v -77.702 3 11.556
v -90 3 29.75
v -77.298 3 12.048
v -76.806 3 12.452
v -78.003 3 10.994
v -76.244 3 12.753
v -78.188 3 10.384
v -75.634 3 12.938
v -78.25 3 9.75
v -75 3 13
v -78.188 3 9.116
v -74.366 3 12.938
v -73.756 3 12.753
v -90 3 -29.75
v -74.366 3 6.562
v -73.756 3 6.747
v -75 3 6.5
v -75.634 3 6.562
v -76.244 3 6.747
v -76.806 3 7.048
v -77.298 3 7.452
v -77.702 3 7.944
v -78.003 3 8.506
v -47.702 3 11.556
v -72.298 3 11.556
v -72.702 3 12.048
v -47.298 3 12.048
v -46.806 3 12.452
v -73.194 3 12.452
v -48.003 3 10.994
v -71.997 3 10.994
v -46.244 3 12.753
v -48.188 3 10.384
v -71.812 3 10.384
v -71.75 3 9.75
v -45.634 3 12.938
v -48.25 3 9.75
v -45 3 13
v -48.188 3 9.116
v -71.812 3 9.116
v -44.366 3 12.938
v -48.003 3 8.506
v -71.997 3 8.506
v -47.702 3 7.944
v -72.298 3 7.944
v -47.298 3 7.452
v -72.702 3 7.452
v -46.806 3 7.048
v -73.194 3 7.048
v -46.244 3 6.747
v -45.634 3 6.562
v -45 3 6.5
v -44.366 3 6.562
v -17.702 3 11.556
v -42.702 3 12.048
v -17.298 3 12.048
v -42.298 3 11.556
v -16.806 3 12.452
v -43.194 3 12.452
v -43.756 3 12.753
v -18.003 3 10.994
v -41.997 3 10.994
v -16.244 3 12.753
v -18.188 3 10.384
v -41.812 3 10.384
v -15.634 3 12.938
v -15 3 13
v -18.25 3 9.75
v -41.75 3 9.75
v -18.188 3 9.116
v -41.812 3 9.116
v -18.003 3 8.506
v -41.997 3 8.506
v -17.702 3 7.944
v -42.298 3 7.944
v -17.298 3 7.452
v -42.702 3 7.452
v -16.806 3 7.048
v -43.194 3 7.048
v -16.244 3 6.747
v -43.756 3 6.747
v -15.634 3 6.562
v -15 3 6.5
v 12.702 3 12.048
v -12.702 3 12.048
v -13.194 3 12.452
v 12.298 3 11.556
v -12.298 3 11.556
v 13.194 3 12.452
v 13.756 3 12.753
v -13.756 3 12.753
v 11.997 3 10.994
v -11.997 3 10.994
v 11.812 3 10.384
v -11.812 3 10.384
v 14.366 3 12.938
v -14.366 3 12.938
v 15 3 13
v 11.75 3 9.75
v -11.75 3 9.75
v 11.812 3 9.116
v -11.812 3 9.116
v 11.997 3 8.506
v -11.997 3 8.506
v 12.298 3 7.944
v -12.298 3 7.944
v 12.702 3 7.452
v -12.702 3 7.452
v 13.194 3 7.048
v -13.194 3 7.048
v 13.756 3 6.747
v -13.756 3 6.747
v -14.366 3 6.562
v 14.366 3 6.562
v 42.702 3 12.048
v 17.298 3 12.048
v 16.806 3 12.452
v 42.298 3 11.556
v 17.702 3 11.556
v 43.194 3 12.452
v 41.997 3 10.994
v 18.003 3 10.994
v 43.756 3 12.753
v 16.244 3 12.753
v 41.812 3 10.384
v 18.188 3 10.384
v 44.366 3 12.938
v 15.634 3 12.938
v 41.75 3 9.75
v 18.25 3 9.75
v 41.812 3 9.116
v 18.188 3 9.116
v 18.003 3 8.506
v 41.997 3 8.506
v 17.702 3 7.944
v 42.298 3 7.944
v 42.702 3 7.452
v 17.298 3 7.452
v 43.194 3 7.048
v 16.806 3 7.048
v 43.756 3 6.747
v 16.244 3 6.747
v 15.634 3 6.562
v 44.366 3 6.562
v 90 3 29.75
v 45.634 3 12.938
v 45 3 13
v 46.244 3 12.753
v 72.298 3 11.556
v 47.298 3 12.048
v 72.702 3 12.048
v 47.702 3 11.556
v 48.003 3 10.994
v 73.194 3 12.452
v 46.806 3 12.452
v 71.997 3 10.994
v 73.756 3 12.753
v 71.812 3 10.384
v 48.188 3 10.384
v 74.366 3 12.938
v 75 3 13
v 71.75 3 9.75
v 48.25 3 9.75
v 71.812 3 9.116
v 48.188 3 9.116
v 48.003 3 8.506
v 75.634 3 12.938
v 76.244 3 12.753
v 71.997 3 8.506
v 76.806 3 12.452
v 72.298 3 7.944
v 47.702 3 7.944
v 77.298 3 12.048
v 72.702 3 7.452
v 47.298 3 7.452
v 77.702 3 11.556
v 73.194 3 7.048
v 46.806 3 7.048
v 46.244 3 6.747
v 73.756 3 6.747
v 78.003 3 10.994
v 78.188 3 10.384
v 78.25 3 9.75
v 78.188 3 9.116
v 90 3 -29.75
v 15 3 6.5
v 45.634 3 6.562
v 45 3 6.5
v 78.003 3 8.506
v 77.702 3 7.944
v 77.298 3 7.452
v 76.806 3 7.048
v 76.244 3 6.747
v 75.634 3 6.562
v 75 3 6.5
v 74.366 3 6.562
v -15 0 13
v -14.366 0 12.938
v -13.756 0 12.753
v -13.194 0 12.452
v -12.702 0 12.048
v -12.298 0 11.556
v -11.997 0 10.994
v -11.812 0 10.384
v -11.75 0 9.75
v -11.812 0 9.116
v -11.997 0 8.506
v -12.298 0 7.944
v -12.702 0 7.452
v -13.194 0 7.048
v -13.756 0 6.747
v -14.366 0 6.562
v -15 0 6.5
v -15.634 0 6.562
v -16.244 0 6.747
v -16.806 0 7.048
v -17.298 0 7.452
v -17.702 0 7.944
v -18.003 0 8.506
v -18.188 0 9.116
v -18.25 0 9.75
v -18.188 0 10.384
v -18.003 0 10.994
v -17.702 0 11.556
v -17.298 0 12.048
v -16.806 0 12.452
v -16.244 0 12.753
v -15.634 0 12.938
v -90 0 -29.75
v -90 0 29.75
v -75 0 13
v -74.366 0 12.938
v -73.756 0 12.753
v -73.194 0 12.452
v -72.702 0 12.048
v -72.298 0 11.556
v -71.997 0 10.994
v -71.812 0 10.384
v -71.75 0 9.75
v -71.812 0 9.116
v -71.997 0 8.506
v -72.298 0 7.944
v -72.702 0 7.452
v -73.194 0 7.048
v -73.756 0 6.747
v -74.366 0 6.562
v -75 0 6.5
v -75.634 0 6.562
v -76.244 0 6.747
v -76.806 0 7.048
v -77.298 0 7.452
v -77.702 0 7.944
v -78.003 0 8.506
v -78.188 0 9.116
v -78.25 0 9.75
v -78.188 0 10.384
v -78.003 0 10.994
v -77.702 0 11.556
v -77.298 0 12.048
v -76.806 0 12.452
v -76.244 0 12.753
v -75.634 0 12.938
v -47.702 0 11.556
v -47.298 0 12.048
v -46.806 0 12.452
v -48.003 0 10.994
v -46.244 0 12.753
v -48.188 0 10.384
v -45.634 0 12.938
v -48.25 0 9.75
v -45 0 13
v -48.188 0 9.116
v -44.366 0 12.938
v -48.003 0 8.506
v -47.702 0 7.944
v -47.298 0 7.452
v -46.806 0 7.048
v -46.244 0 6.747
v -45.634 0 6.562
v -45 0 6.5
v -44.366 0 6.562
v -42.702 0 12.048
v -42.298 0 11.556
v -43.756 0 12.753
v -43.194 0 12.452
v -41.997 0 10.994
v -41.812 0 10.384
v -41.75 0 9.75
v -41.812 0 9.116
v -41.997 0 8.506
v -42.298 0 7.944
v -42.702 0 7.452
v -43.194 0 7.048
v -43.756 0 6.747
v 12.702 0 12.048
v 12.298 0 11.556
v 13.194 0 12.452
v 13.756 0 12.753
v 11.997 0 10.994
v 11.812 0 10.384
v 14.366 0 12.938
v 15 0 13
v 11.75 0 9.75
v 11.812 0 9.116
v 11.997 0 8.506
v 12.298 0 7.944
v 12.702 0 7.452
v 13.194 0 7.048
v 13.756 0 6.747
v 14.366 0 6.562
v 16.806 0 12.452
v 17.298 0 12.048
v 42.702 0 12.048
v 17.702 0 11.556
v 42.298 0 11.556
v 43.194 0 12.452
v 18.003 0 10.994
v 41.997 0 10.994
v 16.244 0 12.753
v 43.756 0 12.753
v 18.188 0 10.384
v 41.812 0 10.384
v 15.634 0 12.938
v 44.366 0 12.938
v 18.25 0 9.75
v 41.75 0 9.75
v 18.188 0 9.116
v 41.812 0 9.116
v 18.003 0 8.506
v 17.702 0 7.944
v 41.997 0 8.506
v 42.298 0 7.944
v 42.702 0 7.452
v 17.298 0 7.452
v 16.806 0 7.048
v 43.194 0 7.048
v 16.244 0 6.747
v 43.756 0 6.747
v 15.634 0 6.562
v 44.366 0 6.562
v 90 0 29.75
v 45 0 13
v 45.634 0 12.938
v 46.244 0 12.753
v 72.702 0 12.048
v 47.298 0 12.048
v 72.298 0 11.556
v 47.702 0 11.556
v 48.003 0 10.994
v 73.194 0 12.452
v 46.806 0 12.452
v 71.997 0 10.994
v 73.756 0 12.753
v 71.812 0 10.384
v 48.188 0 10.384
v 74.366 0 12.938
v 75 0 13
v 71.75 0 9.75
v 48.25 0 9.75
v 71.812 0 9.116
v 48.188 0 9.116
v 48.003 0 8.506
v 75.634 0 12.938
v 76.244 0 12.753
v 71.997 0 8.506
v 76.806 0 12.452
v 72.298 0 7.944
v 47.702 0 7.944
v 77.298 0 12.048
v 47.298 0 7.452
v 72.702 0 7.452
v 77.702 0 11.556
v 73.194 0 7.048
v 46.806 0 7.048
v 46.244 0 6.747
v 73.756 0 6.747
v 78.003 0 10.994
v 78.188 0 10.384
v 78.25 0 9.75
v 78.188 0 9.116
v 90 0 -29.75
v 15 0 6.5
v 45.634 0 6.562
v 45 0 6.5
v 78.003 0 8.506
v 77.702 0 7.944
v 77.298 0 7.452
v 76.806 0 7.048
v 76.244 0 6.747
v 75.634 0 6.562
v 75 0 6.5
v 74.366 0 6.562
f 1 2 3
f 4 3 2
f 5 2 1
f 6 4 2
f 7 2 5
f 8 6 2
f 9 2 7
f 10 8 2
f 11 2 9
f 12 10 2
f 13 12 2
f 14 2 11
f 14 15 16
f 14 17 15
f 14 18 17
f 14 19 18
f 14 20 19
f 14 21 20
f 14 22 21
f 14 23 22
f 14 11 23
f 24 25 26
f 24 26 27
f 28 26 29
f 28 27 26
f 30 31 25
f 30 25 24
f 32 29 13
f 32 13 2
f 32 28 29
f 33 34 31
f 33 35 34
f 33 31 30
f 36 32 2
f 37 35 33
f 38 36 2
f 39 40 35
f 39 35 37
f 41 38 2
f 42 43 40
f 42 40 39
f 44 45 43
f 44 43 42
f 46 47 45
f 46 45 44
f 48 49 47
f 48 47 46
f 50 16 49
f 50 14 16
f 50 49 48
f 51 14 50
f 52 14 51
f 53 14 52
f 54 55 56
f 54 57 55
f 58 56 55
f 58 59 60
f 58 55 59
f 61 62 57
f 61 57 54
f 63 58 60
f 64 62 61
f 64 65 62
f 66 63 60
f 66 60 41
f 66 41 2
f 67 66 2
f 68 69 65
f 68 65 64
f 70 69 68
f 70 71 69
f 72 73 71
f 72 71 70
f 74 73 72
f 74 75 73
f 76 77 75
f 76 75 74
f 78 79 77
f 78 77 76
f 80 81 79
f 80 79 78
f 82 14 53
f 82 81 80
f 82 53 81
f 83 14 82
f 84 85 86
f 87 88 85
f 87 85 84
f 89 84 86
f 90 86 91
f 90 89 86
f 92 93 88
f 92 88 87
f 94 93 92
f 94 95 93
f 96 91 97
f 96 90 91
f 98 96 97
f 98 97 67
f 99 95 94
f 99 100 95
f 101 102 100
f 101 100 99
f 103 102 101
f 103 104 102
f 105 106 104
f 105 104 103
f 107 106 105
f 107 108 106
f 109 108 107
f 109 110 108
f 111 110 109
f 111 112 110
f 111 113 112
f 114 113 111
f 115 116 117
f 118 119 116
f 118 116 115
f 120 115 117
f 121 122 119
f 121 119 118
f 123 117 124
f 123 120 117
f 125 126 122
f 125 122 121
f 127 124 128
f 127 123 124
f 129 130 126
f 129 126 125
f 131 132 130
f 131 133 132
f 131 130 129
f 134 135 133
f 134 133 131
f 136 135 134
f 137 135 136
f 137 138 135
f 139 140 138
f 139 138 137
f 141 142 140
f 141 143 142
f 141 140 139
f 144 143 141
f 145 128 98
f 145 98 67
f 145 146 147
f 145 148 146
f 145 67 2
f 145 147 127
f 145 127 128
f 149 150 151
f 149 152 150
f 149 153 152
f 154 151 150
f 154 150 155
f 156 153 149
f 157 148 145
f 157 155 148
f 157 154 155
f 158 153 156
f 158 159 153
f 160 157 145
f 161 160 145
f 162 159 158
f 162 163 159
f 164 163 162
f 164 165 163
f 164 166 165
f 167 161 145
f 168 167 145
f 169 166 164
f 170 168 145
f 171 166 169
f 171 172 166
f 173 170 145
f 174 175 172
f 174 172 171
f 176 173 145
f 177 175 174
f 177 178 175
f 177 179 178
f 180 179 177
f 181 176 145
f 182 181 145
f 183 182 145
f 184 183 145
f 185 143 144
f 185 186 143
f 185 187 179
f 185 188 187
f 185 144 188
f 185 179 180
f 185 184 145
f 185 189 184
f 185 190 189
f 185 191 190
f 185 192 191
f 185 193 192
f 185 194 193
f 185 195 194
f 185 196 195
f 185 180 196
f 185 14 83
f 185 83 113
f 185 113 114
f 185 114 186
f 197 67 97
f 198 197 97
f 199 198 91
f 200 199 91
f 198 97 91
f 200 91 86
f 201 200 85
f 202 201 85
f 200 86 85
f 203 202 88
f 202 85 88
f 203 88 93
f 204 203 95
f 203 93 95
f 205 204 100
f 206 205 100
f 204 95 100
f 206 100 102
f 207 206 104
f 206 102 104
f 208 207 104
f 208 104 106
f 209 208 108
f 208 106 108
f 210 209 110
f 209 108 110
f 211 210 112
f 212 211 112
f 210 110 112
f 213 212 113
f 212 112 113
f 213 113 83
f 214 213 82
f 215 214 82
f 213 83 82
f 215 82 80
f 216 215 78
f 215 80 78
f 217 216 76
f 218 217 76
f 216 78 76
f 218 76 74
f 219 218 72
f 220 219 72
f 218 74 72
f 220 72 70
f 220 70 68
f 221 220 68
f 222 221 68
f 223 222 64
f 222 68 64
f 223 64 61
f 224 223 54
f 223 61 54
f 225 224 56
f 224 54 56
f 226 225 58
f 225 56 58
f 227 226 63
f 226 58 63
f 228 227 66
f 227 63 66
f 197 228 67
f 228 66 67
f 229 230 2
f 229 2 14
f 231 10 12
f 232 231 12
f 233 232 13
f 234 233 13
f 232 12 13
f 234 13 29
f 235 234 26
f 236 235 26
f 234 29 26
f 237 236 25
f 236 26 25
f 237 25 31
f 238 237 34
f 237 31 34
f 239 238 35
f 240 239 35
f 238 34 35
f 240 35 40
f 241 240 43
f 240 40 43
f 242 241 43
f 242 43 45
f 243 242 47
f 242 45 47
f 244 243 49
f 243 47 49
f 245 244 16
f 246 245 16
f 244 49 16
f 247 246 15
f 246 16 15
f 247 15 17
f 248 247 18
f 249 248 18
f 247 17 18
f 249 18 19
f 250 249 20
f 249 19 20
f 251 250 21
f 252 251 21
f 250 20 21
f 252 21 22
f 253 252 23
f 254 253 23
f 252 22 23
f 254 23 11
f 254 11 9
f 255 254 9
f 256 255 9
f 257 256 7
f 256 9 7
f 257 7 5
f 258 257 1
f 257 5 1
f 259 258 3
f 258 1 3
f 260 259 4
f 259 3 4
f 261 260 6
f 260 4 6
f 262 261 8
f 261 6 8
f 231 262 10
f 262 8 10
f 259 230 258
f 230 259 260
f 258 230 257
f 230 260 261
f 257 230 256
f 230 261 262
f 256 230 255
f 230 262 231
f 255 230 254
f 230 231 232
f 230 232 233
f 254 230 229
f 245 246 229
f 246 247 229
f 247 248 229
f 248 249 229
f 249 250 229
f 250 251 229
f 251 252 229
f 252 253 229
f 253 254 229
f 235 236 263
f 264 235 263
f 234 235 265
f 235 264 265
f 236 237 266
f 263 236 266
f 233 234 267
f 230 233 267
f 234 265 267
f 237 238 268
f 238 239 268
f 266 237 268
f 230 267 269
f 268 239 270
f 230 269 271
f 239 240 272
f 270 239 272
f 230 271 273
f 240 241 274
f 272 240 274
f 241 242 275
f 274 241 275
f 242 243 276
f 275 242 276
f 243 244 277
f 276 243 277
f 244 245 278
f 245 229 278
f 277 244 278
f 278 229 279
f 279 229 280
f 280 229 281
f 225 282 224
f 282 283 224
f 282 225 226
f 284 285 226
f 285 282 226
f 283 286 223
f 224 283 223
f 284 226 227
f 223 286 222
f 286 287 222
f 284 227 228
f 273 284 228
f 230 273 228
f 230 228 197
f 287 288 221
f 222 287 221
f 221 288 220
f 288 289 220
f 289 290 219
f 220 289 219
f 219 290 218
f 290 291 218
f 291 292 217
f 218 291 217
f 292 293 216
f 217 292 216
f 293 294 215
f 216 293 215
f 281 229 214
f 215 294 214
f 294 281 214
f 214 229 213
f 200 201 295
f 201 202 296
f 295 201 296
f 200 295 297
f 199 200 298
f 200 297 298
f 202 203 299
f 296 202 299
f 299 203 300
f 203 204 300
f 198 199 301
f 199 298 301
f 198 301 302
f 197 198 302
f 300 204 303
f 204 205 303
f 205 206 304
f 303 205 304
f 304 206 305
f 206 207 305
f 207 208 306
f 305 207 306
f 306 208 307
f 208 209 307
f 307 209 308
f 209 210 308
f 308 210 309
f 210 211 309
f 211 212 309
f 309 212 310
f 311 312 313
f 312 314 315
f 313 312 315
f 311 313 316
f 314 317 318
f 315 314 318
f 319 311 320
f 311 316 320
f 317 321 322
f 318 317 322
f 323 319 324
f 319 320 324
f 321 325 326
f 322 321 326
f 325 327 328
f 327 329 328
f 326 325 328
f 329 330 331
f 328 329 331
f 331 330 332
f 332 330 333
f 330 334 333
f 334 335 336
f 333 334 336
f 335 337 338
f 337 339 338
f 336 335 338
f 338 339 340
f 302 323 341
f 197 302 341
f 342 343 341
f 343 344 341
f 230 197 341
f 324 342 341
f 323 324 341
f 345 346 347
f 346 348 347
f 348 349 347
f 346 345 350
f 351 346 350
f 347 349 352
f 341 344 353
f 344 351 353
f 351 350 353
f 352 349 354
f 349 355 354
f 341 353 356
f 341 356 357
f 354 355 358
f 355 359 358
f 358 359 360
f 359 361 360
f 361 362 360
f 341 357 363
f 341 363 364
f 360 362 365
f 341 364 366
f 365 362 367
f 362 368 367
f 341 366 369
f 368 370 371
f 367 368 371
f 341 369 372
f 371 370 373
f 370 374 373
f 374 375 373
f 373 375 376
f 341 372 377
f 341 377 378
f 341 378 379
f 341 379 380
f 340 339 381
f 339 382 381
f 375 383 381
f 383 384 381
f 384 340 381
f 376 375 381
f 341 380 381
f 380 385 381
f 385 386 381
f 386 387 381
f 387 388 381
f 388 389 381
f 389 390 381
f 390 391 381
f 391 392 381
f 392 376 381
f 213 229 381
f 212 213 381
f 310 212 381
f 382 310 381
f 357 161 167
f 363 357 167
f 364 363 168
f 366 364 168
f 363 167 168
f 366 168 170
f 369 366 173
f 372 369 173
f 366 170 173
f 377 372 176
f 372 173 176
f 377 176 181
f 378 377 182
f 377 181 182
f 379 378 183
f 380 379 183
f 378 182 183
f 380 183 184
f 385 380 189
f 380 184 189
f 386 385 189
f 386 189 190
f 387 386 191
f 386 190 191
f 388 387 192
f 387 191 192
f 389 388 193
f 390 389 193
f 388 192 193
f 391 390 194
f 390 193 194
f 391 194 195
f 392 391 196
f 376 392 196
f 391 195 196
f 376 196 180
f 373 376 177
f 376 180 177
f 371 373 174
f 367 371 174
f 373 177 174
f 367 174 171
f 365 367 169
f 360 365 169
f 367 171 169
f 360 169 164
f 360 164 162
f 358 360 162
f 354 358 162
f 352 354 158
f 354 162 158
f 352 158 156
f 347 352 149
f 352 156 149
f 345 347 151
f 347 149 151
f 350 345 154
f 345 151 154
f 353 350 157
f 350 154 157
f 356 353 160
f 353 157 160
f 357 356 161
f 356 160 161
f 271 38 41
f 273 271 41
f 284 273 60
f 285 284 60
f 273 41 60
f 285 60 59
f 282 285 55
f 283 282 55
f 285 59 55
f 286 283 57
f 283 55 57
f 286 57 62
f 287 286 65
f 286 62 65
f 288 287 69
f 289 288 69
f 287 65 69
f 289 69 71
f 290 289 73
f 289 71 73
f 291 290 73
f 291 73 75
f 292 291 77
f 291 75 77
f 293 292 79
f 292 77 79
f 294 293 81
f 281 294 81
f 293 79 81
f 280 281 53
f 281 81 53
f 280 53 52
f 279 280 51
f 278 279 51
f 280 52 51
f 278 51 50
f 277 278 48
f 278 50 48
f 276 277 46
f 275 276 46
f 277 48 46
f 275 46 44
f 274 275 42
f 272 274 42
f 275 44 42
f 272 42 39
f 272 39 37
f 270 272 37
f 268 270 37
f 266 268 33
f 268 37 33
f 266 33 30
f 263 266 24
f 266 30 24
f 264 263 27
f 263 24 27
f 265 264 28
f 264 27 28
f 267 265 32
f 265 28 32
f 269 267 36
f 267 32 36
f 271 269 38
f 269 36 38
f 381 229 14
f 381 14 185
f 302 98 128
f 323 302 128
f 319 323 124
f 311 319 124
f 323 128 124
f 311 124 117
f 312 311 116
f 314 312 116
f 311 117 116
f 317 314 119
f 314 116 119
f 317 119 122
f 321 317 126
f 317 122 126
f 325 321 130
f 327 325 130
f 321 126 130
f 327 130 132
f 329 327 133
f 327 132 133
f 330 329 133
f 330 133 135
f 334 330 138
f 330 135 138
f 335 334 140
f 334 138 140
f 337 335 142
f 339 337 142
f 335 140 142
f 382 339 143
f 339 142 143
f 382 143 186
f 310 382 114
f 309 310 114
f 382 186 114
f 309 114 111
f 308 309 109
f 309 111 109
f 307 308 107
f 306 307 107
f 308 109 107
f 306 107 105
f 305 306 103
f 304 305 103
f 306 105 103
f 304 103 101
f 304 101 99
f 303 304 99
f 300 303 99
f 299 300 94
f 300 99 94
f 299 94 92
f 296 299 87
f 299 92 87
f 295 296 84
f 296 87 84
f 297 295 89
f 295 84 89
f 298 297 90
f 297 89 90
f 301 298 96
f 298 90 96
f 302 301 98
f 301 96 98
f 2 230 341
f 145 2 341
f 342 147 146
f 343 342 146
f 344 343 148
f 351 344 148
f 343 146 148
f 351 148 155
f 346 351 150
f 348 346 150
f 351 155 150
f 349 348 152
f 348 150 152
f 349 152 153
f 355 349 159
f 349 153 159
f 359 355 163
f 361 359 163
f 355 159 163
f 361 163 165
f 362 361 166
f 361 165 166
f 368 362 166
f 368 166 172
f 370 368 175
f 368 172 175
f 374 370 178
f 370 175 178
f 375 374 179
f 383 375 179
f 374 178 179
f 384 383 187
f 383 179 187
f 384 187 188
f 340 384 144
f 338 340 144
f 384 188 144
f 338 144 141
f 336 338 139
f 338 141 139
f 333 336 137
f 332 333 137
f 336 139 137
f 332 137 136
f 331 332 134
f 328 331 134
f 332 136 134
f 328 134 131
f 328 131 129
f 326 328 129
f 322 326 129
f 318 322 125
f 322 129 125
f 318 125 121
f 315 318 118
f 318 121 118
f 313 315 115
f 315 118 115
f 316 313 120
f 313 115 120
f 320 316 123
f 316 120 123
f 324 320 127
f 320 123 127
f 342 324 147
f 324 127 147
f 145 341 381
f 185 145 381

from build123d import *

# Parameters (mm, degrees)
SKIZZE1_W                       = 180
SKIZZE1_H                       = 59.5
AUFSATZ_LINEAR_AUSTRAGEN1_DEPTH = 3
SKIZZE2_R                       = 3.25
SCHNITT_LINEAR_AUSTRAGEN1_DEPTH = 3


with BuildPart() as part:
    # Skizze1 → Aufsatz-Linear austragen1 (new body)
    with BuildSketch(Plane(origin=(0, 0, 0), x_dir=(1, 0, 0), z_dir=(0, 1, 0))):
        Rectangle(SKIZZE1_W, SKIZZE1_H)
    extrude(amount=AUFSATZ_LINEAR_AUSTRAGEN1_DEPTH)

    # Skizze2 → Schnitt-Linear austragen1 (cut)
    with BuildSketch(Plane(origin=(0, 3, 0), x_dir=(1, 0, 0), z_dir=(0, 1, 0))):
        with Locations(Location((-75, -9.75, 0), (0, 0, 270))):
            Circle(SKIZZE2_R)
        with Locations(Location((-45, -9.75, 0), (0, 0, 270))):
            Circle(SKIZZE2_R)
        with Locations(Location((-15, -9.75, 0), (0, 0, 270))):
            Circle(SKIZZE2_R)
        with Locations(Location((15, -9.75, 0), (0, 0, 270))):
            Circle(SKIZZE2_R)
        with Locations(Location((45, -9.75, 0), (0, 0, 270))):
            Circle(SKIZZE2_R)
        with Locations(Location((75, -9.75, 0), (0, 0, 270))):
            Circle(SKIZZE2_R)
    extrude(amount=-SCHNITT_LINEAR_AUSTRAGEN1_DEPTH, mode=Mode.SUBTRACT)


solid = part.part
